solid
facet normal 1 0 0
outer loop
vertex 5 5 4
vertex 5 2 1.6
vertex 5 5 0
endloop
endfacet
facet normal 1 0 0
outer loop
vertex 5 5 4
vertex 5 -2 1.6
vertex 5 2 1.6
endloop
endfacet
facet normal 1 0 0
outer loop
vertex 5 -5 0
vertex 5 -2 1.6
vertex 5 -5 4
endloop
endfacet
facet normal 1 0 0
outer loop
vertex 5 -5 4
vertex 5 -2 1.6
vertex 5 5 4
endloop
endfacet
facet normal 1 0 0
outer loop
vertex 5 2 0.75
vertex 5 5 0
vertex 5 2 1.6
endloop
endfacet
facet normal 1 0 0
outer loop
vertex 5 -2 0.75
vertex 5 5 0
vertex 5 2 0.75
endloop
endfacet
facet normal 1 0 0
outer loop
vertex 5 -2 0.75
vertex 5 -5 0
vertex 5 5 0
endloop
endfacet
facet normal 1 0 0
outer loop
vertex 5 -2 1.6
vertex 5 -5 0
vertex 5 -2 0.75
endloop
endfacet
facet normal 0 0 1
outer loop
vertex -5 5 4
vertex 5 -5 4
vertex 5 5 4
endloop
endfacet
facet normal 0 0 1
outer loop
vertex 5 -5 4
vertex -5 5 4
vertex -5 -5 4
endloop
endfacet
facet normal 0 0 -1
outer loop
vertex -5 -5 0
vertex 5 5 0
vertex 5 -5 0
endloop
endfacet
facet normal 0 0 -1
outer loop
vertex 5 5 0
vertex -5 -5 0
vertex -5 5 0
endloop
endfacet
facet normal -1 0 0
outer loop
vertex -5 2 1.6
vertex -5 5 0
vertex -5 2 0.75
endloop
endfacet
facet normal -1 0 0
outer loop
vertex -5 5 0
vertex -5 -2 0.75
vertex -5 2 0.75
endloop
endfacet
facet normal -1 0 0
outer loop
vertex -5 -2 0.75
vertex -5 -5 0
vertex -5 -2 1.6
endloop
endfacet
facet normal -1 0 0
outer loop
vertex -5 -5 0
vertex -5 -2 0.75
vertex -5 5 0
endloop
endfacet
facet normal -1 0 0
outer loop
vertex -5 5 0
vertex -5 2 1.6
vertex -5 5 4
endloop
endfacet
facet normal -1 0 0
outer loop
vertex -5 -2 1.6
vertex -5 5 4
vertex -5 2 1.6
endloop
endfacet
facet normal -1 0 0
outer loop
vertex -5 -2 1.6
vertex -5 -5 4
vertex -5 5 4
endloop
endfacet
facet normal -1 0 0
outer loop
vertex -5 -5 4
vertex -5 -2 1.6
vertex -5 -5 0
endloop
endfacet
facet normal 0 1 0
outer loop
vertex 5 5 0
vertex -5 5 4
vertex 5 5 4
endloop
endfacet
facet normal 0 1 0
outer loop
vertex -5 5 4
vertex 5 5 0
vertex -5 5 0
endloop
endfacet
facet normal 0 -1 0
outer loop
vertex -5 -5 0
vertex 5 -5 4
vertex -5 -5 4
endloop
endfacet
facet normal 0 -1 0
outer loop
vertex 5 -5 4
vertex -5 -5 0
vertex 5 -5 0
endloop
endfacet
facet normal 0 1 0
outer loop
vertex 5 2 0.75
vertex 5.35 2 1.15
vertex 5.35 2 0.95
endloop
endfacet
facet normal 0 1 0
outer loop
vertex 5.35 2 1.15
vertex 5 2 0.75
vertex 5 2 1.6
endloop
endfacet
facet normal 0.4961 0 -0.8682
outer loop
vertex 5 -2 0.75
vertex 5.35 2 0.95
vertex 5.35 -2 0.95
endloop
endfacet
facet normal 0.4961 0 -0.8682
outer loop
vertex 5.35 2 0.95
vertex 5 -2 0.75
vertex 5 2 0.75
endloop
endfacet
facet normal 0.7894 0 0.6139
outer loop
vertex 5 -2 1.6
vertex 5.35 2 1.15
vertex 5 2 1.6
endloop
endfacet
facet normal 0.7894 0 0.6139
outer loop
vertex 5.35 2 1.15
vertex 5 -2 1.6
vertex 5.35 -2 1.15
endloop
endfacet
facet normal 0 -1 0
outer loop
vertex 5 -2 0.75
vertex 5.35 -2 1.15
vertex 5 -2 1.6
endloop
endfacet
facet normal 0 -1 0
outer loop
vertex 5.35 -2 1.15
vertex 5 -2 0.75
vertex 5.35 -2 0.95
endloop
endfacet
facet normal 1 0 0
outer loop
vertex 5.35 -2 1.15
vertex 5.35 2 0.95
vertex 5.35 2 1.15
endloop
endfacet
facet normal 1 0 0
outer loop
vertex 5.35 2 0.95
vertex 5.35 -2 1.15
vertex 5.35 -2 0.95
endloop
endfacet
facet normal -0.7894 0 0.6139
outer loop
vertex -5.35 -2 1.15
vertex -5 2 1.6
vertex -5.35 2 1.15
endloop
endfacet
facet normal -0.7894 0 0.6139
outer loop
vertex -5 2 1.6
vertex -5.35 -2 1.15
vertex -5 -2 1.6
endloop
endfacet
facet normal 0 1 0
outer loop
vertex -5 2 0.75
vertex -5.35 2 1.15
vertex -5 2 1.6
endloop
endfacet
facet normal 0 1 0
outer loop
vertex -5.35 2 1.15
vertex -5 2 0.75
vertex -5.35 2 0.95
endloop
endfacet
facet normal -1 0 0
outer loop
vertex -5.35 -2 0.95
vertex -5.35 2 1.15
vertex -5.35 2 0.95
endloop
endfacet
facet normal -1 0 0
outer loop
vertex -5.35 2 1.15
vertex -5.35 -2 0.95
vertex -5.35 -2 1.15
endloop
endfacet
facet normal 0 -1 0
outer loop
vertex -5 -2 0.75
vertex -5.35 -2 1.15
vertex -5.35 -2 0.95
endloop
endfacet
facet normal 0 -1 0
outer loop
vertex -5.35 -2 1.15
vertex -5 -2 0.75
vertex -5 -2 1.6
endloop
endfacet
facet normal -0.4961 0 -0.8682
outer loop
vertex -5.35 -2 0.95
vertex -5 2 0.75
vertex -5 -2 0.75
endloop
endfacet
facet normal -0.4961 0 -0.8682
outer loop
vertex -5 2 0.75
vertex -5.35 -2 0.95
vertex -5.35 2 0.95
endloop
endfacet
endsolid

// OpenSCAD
// file: ../lib/at01_inverted_core_snap.scad
// File: at01_inverted_core_snap.scad
// AT-01 — experiment-owned inverted fixed-core / removable-shell snap.
//
// This geometry does not copy the QuackWorks/OpenGrid snap. It keeps only the
// high-level design lessons: compact fixed side, removable compliant side,
// explicit locating/retention roles, and a Lite-like 4.0 / 3.4 mm Z baseline.

// Fixed-side baseline.
AT01_CORE_SIZE = 10.0;
AT01_CORE_HEIGHT = 4.0;
AT01_ROOT_SHOULDER = 0.6;
AT01_ENGAGEMENT_HEIGHT = 3.4;

// Removable shell.
AT01_CLEARANCE = 0.20;              // per side on nominal 10 x 10 core
AT01_SHELL_WALL = 1.20;
AT01_SHELL_TOP = 1.20;
AT01_SHELL_INNER = AT01_CORE_SIZE + 2 * AT01_CLEARANCE;
AT01_SHELL_OUTER = AT01_SHELL_INNER + 2 * AT01_SHELL_WALL;
AT01_SHELL_HEIGHT = AT01_ENGAGEMENT_HEIGHT + AT01_SHELL_TOP;

// Two-sided retention on +/-X.
AT01_RIB_PROTRUSION = 0.35;
AT01_RIB_WIDTH = 4.0;
AT01_RIB_Z_BOTTOM = 0.75;
AT01_RIB_Z_LOWER_MAX = 0.95;
AT01_RIB_Z_UPPER_MAX = 1.15;
AT01_RIB_Z_TOP = 1.60;

// Receiving window in each compliant shell tongue.
// Values are shell-local; assembled shell starts at Z=AT01_ROOT_SHOULDER.
AT01_WINDOW_WIDTH = 4.8;
AT01_WINDOW_Z_MIN = 0.05;
AT01_WINDOW_Z_MAX = 1.10;

// Two relief slots isolate the center tongue on each +/-X wall.
AT01_FLEX_SLOT_Y = 3.0;
AT01_FLEX_SLOT_WIDTH = 0.8;

// Evidence helpers.
AT01_EXPLODED_Z = 8.0;
AT01_PROFILE_SLICE = 1.0;

assert(
    abs(AT01_ROOT_SHOULDER + AT01_ENGAGEMENT_HEIGHT - AT01_CORE_HEIGHT) < 0.0001,
    "AT-01 Lite baseline must satisfy shoulder + engagement = 4.0 mm."
);
assert(
    abs(AT01_SHELL_INNER - (AT01_CORE_SIZE + 2 * AT01_CLEARANCE)) < 0.0001,
    "AT-01 shell inner size must preserve the stated side clearance."
);

module _at01_positive_x_retention_rib() {
    // Polygon is defined in X/Z and extruded along Y.
    rotate([90, 0, 0])
        linear_extrude(height = AT01_RIB_WIDTH, center = true, convexity = 10)
            polygon(points = [
                [AT01_CORE_SIZE / 2, AT01_RIB_Z_BOTTOM],
                [AT01_CORE_SIZE / 2 + AT01_RIB_PROTRUSION, AT01_RIB_Z_LOWER_MAX],
                [AT01_CORE_SIZE / 2 + AT01_RIB_PROTRUSION, AT01_RIB_Z_UPPER_MAX],
                [AT01_CORE_SIZE / 2, AT01_RIB_Z_TOP]
            ]);
}

module at01_fixed_core() {
    union() {
        translate([-AT01_CORE_SIZE / 2, -AT01_CORE_SIZE / 2, 0])
            cube([AT01_CORE_SIZE, AT01_CORE_SIZE, AT01_CORE_HEIGHT]);

        _at01_positive_x_retention_rib();

        mirror([1, 0, 0])
            _at01_positive_x_retention_rib();
    }
}

module _at01_shell_outer() {
    translate([-AT01_SHELL_OUTER / 2, -AT01_SHELL_OUTER / 2, 0])
        cube([AT01_SHELL_OUTER, AT01_SHELL_OUTER, AT01_SHELL_HEIGHT]);
}

module _at01_shell_cavity() {
    // Ends exactly at the underside of the top plate.
    translate([-AT01_SHELL_INNER / 2, -AT01_SHELL_INNER / 2, -0.05])
        cube([AT01_SHELL_INNER, AT01_SHELL_INNER, AT01_ENGAGEMENT_HEIGHT + 0.05]);
}

module _at01_retention_window(x_sign = 1) {
    wall_center = (AT01_SHELL_INNER / 2 + AT01_SHELL_OUTER / 2) / 2;
    translate([
        x_sign * wall_center,
        0,
        (AT01_WINDOW_Z_MIN + AT01_WINDOW_Z_MAX) / 2
    ])
        cube([
            AT01_SHELL_WALL + 0.4,
            AT01_WINDOW_WIDTH,
            AT01_WINDOW_Z_MAX - AT01_WINDOW_Z_MIN
        ], center = true);
}

module _at01_flex_slot(x_sign = 1, y_sign = 1) {
    wall_center = (AT01_SHELL_INNER / 2 + AT01_SHELL_OUTER / 2) / 2;
    translate([
        x_sign * wall_center,
        y_sign * AT01_FLEX_SLOT_Y,
        AT01_ENGAGEMENT_HEIGHT / 2
    ])
        cube([
            AT01_SHELL_WALL + 0.4,
            AT01_FLEX_SLOT_WIDTH,
            AT01_ENGAGEMENT_HEIGHT + 0.10
        ], center = true);
}

module at01_removable_shell() {
    difference() {
        _at01_shell_outer();
        _at01_shell_cavity();

        for (x_sign = [-1, 1]) {
            _at01_retention_window(x_sign);

            for (y_sign = [-1, 1])
                _at01_flex_slot(x_sign, y_sign);
        }
    }
}

module at01_assembled(shell_alpha = 0.55) {
    color([0.68, 0.70, 0.74])
        at01_fixed_core();

    translate([0, 0, AT01_ROOT_SHOULDER])
        color([0.92, 0.30, 0.12, shell_alpha])
            at01_removable_shell();
}

module at01_exploded() {
    color([0.68, 0.70, 0.74])
        at01_fixed_core();

    translate([0, 0, AT01_ROOT_SHOULDER + AT01_EXPLODED_Z])
        color([0.92, 0.30, 0.12])
            at01_removable_shell();
}

module _at01_retention_slice_volume() {
    translate([-20, -AT01_PROFILE_SLICE / 2, -1])
        cube([40, AT01_PROFILE_SLICE, 12]);
}

module _at01_locating_slice_volume() {
    translate([-AT01_PROFILE_SLICE / 2, -20, -1])
        cube([AT01_PROFILE_SLICE, 40, 12]);
}

module at01_fixed_retention_profile() {
    intersection() {
        at01_fixed_core();
        _at01_retention_slice_volume();
    }
}

module at01_shell_retention_profile() {
    intersection() {
        at01_removable_shell();
        translate([0, 0, -AT01_ROOT_SHOULDER])
            _at01_retention_slice_volume();
    }
}

module at01_fixed_locating_profile() {
    intersection() {
        at01_fixed_core();
        _at01_locating_slice_volume();
    }
}

module at01_shell_locating_profile() {
    intersection() {
        at01_removable_shell();
        translate([0, 0, -AT01_ROOT_SHOULDER])
            _at01_locating_slice_volume();
    }
}

module at01_retention_section() {
    color([0.68, 0.70, 0.74])
        at01_fixed_retention_profile();

    translate([0, 0, AT01_ROOT_SHOULDER])
        color([0.92, 0.30, 0.12])
            at01_shell_retention_profile();
}

module at01_locating_section() {
    color([0.68, 0.70, 0.74])
        at01_fixed_locating_profile();

    translate([0, 0, AT01_ROOT_SHOULDER])
        color([0.92, 0.30, 0.12])
            at01_shell_locating_profile();
}
// main file
include <../lib/at01_inverted_core_snap.scad>
$vpt=[0,0,2]; $vpr=[68,0,35]; $vpd=42;
color([0.68,0.70,0.74]) at01_fixed_core();
